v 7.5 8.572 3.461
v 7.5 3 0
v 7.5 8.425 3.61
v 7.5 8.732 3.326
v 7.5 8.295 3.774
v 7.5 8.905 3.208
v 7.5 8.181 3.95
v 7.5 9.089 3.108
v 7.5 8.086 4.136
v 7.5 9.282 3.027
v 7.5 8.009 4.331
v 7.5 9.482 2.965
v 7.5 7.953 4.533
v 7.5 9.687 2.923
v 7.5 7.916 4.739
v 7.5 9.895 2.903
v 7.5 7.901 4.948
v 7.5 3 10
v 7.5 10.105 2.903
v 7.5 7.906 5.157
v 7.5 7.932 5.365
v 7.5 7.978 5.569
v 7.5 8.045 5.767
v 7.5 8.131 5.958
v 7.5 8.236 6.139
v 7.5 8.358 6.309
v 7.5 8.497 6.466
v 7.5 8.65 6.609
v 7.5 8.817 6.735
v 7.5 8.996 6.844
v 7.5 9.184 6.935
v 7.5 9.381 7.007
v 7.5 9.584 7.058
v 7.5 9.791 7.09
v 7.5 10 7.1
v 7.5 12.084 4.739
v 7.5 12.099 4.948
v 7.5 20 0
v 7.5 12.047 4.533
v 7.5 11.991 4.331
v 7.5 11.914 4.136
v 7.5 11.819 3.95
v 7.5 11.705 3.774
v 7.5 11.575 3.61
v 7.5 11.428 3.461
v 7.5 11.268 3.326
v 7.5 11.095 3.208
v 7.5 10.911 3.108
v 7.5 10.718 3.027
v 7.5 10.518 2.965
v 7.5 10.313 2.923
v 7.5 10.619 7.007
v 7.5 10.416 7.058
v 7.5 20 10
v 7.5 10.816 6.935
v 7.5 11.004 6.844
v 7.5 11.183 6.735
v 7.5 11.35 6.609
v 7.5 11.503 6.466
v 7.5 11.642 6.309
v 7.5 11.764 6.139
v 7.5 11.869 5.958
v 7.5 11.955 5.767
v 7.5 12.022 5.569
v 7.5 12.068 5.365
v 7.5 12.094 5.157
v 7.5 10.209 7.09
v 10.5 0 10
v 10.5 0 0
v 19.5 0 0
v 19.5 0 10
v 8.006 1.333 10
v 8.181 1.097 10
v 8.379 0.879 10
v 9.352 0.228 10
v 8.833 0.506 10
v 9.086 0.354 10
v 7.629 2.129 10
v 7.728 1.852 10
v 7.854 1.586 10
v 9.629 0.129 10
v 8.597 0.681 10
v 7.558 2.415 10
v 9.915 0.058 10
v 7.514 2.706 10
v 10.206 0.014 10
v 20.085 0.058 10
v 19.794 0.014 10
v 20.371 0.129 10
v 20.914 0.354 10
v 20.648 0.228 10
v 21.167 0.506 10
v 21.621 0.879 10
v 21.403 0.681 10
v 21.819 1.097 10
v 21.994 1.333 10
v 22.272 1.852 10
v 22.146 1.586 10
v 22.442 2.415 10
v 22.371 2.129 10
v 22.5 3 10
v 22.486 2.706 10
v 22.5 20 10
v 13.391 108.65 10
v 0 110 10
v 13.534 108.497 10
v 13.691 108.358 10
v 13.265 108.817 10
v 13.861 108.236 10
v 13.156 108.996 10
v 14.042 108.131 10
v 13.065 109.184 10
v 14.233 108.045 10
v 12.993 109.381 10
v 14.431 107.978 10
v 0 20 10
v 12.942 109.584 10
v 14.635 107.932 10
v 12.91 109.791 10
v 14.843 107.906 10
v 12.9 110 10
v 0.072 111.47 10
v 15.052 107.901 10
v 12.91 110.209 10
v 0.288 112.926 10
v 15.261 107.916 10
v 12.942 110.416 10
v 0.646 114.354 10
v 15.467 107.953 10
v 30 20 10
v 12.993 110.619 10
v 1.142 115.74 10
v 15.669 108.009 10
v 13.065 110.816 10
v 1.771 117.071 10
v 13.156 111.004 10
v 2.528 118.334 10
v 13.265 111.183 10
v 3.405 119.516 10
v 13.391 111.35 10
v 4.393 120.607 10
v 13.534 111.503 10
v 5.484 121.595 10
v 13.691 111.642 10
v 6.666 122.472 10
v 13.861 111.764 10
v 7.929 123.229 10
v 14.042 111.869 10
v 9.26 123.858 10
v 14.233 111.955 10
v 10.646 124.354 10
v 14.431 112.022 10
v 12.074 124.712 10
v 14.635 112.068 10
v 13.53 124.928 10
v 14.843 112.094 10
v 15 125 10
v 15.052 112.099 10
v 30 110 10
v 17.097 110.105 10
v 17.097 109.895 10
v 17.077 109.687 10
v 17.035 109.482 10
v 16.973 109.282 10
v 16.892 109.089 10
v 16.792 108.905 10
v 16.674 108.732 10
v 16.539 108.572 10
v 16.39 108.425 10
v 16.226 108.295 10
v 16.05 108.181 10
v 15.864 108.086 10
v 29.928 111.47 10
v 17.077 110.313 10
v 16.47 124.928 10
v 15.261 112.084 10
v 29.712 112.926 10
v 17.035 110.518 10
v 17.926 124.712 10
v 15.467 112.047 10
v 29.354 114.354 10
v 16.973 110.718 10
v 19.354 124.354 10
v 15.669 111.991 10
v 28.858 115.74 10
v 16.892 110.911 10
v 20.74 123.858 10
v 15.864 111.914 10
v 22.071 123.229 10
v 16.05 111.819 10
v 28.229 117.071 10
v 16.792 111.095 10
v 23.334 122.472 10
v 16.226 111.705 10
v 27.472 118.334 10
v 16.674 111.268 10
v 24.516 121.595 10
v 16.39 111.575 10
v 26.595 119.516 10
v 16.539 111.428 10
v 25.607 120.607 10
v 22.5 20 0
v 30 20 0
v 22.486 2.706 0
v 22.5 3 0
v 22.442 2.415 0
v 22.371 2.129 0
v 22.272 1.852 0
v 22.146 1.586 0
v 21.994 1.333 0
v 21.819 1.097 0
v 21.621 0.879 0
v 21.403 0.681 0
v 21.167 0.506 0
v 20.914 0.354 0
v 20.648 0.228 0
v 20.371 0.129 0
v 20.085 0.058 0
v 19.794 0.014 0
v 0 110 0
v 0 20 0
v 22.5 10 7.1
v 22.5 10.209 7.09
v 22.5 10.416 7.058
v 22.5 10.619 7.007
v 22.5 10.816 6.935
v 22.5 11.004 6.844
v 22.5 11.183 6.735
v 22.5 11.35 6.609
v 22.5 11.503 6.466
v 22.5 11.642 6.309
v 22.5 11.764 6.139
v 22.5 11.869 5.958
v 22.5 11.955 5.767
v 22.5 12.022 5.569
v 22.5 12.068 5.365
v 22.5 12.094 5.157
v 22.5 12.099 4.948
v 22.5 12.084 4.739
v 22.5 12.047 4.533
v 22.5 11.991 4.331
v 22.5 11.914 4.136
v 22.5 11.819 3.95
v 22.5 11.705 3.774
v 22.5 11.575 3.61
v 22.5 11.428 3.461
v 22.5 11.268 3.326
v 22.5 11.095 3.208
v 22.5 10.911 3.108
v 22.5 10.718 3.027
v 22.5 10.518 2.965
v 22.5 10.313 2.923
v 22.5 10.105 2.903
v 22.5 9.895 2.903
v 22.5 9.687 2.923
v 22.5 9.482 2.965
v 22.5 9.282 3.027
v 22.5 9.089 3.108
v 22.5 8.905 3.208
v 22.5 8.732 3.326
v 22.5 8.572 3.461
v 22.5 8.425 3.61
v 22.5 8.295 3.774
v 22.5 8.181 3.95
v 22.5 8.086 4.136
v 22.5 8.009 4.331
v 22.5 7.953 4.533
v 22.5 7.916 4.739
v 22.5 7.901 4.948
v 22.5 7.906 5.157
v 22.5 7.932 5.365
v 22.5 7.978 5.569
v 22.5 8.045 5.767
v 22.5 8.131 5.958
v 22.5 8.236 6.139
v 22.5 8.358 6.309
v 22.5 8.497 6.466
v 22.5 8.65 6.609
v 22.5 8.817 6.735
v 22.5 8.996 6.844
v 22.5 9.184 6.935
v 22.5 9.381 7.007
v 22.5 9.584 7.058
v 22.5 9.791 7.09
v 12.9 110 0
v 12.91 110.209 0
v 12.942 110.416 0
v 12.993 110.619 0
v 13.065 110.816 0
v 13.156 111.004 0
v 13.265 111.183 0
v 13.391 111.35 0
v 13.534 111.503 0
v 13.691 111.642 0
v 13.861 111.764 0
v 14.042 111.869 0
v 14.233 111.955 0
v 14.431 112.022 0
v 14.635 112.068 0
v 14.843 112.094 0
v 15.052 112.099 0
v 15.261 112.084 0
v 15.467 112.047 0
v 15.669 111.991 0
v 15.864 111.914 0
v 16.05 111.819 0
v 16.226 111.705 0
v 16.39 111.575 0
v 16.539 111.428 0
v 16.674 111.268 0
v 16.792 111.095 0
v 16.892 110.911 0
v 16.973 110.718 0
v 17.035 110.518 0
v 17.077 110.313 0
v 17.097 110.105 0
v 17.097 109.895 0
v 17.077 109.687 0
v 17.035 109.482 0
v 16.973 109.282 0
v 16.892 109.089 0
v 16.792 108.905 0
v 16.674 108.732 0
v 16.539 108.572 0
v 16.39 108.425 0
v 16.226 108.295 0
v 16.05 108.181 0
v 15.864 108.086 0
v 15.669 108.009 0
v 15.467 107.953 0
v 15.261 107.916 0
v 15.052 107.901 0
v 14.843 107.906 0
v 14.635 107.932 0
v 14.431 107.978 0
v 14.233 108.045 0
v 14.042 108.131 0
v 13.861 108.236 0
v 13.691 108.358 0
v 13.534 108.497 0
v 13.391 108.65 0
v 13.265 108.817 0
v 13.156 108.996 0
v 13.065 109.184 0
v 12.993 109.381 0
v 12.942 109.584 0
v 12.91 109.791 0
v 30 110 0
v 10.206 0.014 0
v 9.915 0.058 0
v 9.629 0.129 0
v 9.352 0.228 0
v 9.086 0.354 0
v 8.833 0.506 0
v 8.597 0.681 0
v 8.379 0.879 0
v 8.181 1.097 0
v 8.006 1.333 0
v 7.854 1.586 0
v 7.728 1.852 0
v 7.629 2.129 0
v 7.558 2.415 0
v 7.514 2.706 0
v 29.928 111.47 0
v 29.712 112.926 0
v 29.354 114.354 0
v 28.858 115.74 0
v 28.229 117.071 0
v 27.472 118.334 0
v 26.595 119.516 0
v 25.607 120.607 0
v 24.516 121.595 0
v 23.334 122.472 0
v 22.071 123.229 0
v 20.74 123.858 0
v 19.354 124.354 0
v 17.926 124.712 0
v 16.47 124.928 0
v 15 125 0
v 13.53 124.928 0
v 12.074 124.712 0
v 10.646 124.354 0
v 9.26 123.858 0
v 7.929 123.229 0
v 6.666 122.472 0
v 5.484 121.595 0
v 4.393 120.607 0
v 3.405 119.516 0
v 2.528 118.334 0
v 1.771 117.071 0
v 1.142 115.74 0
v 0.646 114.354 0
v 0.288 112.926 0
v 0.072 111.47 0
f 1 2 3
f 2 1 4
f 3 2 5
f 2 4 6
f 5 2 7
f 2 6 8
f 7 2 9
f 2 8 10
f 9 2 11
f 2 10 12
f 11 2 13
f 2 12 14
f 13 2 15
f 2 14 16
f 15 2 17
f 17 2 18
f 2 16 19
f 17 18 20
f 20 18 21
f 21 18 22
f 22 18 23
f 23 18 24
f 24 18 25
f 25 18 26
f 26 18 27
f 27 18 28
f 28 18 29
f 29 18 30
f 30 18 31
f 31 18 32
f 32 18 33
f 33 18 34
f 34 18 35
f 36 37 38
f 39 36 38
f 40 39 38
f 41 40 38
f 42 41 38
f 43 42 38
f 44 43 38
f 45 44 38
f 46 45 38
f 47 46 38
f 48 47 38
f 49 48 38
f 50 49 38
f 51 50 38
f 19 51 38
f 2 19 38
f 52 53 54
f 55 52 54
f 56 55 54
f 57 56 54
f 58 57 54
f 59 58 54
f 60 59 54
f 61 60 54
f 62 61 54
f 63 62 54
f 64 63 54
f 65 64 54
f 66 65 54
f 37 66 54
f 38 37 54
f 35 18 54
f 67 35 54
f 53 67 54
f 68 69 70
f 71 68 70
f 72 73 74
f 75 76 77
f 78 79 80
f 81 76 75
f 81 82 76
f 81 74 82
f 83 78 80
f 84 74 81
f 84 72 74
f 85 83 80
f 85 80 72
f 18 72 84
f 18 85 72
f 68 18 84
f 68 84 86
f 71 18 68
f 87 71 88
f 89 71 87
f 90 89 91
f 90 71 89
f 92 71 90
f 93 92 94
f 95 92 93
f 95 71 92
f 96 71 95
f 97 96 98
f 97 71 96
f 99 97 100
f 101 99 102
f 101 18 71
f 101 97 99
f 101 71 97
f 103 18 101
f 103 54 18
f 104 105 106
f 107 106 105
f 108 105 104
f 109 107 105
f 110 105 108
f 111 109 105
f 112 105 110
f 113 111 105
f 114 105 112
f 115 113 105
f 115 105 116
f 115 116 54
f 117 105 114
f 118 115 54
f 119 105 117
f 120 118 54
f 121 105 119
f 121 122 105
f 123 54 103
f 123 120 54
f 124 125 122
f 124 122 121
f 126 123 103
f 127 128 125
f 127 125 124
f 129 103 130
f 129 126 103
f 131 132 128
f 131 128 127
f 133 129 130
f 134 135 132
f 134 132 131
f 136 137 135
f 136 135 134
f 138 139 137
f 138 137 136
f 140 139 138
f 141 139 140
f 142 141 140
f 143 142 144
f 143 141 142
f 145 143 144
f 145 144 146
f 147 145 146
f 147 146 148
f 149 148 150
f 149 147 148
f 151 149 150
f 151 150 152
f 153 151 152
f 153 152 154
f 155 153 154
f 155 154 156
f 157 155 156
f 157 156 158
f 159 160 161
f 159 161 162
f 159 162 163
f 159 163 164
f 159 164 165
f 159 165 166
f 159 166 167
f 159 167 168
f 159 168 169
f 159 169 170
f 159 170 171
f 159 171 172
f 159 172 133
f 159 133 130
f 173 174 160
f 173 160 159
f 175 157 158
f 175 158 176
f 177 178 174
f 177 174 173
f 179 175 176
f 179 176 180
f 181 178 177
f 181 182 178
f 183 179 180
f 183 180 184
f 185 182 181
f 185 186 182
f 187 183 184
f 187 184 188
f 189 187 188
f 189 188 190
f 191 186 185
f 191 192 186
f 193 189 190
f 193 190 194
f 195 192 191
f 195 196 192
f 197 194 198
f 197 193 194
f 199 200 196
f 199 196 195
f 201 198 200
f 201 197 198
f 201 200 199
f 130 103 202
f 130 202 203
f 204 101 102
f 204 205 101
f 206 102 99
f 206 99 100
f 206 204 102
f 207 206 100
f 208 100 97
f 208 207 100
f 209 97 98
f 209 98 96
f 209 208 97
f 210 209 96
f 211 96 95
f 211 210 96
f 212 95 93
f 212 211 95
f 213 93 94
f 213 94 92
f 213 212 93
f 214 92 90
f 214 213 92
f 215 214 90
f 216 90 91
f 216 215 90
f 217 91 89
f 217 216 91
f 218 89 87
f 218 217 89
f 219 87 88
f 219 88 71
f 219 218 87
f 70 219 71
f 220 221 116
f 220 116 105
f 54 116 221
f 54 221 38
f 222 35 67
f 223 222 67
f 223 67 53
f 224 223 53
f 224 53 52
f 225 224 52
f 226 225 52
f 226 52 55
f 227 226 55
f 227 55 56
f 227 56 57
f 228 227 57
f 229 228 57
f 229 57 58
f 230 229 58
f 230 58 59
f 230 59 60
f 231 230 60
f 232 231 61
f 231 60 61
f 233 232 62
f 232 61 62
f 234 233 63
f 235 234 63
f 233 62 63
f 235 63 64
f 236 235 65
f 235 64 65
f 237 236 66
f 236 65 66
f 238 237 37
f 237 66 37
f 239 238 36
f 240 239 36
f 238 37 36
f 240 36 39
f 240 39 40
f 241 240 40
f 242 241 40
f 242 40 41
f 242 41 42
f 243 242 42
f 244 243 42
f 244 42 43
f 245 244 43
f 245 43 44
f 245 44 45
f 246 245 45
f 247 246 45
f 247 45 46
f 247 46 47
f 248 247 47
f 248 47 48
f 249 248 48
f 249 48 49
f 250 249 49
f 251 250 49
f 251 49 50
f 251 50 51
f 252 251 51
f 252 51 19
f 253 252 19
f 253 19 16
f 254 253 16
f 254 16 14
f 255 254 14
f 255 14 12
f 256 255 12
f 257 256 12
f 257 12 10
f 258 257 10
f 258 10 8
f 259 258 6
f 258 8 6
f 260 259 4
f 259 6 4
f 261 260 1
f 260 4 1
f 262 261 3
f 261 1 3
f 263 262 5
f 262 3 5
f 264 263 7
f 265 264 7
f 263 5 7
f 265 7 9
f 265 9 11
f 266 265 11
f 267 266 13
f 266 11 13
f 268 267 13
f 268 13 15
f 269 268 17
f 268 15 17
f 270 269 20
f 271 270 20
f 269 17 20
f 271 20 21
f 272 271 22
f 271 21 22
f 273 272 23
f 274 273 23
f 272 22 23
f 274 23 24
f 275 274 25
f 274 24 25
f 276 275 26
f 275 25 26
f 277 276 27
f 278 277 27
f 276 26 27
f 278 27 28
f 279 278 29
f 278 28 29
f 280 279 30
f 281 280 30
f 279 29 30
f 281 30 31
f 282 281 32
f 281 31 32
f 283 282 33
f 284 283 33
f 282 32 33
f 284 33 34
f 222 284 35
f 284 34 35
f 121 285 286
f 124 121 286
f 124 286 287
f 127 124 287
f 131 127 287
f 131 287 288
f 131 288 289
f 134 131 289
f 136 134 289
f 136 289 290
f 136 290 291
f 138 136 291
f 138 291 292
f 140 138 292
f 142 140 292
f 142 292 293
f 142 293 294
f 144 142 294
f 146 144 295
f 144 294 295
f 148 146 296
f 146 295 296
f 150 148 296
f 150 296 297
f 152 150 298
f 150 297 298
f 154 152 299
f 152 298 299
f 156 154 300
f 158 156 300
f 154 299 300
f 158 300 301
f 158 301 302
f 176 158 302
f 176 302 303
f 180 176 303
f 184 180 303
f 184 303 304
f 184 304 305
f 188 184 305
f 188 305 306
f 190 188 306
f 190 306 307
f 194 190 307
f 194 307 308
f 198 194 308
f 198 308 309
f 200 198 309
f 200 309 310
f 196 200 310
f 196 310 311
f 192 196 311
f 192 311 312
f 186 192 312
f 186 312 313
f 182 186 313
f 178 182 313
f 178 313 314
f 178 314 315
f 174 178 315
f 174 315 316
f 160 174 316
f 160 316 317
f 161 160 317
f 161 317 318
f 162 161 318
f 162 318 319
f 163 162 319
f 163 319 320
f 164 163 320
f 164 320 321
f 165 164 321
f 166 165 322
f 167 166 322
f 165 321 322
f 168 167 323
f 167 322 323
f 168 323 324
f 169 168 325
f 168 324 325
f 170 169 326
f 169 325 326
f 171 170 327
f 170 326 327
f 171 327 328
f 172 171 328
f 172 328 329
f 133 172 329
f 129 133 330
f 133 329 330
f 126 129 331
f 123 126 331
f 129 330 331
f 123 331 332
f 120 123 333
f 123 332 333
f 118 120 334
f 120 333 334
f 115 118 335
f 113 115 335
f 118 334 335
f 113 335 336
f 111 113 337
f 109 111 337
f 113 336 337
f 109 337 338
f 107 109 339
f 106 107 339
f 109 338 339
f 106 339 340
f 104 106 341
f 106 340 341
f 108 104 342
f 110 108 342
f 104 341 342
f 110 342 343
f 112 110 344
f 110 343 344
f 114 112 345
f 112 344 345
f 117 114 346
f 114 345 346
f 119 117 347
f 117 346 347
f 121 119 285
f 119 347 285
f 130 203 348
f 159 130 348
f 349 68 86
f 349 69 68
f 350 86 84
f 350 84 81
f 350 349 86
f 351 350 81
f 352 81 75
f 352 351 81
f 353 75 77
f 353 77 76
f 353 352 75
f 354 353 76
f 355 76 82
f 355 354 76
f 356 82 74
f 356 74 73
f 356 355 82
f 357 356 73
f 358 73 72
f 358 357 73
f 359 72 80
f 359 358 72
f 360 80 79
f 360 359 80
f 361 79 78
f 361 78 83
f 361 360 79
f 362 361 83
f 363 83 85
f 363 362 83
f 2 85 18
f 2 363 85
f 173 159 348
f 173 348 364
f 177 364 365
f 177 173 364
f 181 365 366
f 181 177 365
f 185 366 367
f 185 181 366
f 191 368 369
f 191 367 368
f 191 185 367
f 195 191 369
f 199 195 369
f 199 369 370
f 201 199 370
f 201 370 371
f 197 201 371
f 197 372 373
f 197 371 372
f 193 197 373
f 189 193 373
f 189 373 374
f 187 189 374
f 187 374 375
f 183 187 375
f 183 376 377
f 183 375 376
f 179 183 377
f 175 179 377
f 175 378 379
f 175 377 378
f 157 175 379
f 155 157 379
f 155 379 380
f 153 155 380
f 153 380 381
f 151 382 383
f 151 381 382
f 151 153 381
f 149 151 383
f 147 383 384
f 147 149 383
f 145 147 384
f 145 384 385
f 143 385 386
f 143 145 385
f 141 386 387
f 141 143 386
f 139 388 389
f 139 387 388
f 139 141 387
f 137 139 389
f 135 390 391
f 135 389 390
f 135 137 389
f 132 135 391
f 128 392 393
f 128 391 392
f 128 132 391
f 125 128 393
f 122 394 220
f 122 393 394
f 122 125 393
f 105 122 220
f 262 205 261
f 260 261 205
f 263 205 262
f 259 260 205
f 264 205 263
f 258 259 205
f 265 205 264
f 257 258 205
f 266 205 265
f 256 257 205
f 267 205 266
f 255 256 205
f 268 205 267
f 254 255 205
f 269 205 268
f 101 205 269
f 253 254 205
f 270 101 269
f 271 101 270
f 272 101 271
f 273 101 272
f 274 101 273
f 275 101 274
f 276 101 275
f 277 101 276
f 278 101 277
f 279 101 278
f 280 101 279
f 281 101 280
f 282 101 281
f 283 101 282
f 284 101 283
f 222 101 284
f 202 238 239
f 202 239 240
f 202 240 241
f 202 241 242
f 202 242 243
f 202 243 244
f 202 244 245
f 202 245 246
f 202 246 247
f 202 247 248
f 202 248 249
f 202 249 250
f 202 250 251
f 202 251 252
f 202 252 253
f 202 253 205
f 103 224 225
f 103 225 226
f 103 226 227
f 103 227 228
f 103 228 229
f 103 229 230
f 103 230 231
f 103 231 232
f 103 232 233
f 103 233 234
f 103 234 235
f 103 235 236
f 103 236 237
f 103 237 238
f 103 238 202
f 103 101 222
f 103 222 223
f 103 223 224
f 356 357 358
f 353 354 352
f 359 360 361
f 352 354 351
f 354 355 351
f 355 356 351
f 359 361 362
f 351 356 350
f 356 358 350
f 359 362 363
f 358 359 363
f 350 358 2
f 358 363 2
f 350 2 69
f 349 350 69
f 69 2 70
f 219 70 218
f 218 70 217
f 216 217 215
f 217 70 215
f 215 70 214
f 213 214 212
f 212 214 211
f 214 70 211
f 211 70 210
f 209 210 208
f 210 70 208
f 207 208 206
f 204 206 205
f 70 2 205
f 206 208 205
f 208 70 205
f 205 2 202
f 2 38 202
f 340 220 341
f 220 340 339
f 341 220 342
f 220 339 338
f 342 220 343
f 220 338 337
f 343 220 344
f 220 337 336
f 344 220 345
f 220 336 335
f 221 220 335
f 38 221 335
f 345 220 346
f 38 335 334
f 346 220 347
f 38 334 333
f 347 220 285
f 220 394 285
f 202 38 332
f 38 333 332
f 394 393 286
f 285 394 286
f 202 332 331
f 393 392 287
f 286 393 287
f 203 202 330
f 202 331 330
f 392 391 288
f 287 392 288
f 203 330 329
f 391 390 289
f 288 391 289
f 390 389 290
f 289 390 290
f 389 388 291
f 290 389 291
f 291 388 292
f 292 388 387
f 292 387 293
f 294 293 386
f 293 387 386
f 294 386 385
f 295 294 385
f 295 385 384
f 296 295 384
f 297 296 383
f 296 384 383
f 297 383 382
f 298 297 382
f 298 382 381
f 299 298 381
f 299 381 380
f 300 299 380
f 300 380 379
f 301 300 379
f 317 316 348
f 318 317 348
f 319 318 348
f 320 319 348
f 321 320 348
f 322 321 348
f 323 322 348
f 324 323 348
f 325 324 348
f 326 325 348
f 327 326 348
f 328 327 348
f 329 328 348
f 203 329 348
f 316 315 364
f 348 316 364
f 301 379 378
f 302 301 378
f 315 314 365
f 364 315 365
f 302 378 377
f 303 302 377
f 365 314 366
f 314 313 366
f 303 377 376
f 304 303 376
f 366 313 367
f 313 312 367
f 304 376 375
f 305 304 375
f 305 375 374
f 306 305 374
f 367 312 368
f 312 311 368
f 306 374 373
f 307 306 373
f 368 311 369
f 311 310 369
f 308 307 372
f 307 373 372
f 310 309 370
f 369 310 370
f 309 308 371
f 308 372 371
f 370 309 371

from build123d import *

# Parameters (mm, degrees)
SKETCH_1_W          = 30
SKETCH_1_H          = 125
EXTRUDE_1_DEPTH     = 10
SKETCH_2_W          = 7.5
SKETCH_2_H          = 20
CUT_EXTRUDE_1_DEPTH = 10
FILLET_1_R          = 3
SKETCH_3_R          = 2.1
CUT_EXTRUDE_2_DEPTH = 129.937969582
FILLET_2_RADIUS     = 15
FILLET_2_LENGTH     = 10
SKETCH_4_R          = 2.1
CUT_EXTRUDE_3_DEPTH = 129.937969582


with BuildPart() as part:
    # 草图1 → 凸台-拉伸1 (new body)
    with BuildSketch(Plane.XY):
        with Locations((15, 62.5)):
            Rectangle(SKETCH_1_W, SKETCH_1_H)
    extrude(amount=EXTRUDE_1_DEPTH)

    # 草图2 → 切除-拉伸1 (cut)
    with BuildSketch(Plane.XY.offset(10)):
        with Locations((3.75, 10)):
            Rectangle(SKETCH_2_W, SKETCH_2_H)
        with Locations((26.25, 10)):
            Rectangle(SKETCH_2_W, SKETCH_2_H)
    extrude(amount=-CUT_EXTRUDE_1_DEPTH, mode=Mode.SUBTRACT)

    # 圆角1
    fillet_1_edges = [part.edges().sort_by_distance(p)[0] for p in [
        (7.5, 0, 5),
        (22.5, 0, 5),
    ]]
    fillet(fillet_1_edges, radius=FILLET_1_R)

    # 草图3 → 切除-拉伸2 (cut, through all)
    with BuildSketch(Plane.ZY):
        with Locations((5, 10)):
            Circle(SKETCH_3_R)
    extrude(amount=-CUT_EXTRUDE_2_DEPTH, mode=Mode.SUBTRACT)

    # 圆角2: full round fillet: the end face becomes a half cylinder, R = half its width
    fillet_2_face = Plane((15, 125, 5), x_dir=(0, 0, 1), z_dir=(0, 1, 0))  # on the end face: x along it, z out of the body
    fillet_2_slab = fillet_2_face.offset(-FILLET_2_RADIUS / 2) * Box(FILLET_2_LENGTH, 2 * FILLET_2_RADIUS, FILLET_2_RADIUS, mode=Mode.PRIVATE)  # the body's end, R deep
    fillet_2_round = Plane((15, 110, 5), x_dir=(0, 1, 0), z_dir=(0, 0, 1)) * Cylinder(FILLET_2_RADIUS, FILLET_2_LENGTH, mode=Mode.PRIVATE)  # its axis R under the face
    add(fillet_2_slab - fillet_2_round, mode=Mode.SUBTRACT)

    # 草图4 → 切除-拉伸3 (cut, through all)
    with BuildSketch(Plane(origin=(0, 0, 0), x_dir=(-1, 0, 0), z_dir=(0, 0, -1))):
        with Locations((-15, 110)):
            Circle(SKETCH_4_R)
    extrude(amount=-CUT_EXTRUDE_3_DEPTH, mode=Mode.SUBTRACT)


solid = part.part
